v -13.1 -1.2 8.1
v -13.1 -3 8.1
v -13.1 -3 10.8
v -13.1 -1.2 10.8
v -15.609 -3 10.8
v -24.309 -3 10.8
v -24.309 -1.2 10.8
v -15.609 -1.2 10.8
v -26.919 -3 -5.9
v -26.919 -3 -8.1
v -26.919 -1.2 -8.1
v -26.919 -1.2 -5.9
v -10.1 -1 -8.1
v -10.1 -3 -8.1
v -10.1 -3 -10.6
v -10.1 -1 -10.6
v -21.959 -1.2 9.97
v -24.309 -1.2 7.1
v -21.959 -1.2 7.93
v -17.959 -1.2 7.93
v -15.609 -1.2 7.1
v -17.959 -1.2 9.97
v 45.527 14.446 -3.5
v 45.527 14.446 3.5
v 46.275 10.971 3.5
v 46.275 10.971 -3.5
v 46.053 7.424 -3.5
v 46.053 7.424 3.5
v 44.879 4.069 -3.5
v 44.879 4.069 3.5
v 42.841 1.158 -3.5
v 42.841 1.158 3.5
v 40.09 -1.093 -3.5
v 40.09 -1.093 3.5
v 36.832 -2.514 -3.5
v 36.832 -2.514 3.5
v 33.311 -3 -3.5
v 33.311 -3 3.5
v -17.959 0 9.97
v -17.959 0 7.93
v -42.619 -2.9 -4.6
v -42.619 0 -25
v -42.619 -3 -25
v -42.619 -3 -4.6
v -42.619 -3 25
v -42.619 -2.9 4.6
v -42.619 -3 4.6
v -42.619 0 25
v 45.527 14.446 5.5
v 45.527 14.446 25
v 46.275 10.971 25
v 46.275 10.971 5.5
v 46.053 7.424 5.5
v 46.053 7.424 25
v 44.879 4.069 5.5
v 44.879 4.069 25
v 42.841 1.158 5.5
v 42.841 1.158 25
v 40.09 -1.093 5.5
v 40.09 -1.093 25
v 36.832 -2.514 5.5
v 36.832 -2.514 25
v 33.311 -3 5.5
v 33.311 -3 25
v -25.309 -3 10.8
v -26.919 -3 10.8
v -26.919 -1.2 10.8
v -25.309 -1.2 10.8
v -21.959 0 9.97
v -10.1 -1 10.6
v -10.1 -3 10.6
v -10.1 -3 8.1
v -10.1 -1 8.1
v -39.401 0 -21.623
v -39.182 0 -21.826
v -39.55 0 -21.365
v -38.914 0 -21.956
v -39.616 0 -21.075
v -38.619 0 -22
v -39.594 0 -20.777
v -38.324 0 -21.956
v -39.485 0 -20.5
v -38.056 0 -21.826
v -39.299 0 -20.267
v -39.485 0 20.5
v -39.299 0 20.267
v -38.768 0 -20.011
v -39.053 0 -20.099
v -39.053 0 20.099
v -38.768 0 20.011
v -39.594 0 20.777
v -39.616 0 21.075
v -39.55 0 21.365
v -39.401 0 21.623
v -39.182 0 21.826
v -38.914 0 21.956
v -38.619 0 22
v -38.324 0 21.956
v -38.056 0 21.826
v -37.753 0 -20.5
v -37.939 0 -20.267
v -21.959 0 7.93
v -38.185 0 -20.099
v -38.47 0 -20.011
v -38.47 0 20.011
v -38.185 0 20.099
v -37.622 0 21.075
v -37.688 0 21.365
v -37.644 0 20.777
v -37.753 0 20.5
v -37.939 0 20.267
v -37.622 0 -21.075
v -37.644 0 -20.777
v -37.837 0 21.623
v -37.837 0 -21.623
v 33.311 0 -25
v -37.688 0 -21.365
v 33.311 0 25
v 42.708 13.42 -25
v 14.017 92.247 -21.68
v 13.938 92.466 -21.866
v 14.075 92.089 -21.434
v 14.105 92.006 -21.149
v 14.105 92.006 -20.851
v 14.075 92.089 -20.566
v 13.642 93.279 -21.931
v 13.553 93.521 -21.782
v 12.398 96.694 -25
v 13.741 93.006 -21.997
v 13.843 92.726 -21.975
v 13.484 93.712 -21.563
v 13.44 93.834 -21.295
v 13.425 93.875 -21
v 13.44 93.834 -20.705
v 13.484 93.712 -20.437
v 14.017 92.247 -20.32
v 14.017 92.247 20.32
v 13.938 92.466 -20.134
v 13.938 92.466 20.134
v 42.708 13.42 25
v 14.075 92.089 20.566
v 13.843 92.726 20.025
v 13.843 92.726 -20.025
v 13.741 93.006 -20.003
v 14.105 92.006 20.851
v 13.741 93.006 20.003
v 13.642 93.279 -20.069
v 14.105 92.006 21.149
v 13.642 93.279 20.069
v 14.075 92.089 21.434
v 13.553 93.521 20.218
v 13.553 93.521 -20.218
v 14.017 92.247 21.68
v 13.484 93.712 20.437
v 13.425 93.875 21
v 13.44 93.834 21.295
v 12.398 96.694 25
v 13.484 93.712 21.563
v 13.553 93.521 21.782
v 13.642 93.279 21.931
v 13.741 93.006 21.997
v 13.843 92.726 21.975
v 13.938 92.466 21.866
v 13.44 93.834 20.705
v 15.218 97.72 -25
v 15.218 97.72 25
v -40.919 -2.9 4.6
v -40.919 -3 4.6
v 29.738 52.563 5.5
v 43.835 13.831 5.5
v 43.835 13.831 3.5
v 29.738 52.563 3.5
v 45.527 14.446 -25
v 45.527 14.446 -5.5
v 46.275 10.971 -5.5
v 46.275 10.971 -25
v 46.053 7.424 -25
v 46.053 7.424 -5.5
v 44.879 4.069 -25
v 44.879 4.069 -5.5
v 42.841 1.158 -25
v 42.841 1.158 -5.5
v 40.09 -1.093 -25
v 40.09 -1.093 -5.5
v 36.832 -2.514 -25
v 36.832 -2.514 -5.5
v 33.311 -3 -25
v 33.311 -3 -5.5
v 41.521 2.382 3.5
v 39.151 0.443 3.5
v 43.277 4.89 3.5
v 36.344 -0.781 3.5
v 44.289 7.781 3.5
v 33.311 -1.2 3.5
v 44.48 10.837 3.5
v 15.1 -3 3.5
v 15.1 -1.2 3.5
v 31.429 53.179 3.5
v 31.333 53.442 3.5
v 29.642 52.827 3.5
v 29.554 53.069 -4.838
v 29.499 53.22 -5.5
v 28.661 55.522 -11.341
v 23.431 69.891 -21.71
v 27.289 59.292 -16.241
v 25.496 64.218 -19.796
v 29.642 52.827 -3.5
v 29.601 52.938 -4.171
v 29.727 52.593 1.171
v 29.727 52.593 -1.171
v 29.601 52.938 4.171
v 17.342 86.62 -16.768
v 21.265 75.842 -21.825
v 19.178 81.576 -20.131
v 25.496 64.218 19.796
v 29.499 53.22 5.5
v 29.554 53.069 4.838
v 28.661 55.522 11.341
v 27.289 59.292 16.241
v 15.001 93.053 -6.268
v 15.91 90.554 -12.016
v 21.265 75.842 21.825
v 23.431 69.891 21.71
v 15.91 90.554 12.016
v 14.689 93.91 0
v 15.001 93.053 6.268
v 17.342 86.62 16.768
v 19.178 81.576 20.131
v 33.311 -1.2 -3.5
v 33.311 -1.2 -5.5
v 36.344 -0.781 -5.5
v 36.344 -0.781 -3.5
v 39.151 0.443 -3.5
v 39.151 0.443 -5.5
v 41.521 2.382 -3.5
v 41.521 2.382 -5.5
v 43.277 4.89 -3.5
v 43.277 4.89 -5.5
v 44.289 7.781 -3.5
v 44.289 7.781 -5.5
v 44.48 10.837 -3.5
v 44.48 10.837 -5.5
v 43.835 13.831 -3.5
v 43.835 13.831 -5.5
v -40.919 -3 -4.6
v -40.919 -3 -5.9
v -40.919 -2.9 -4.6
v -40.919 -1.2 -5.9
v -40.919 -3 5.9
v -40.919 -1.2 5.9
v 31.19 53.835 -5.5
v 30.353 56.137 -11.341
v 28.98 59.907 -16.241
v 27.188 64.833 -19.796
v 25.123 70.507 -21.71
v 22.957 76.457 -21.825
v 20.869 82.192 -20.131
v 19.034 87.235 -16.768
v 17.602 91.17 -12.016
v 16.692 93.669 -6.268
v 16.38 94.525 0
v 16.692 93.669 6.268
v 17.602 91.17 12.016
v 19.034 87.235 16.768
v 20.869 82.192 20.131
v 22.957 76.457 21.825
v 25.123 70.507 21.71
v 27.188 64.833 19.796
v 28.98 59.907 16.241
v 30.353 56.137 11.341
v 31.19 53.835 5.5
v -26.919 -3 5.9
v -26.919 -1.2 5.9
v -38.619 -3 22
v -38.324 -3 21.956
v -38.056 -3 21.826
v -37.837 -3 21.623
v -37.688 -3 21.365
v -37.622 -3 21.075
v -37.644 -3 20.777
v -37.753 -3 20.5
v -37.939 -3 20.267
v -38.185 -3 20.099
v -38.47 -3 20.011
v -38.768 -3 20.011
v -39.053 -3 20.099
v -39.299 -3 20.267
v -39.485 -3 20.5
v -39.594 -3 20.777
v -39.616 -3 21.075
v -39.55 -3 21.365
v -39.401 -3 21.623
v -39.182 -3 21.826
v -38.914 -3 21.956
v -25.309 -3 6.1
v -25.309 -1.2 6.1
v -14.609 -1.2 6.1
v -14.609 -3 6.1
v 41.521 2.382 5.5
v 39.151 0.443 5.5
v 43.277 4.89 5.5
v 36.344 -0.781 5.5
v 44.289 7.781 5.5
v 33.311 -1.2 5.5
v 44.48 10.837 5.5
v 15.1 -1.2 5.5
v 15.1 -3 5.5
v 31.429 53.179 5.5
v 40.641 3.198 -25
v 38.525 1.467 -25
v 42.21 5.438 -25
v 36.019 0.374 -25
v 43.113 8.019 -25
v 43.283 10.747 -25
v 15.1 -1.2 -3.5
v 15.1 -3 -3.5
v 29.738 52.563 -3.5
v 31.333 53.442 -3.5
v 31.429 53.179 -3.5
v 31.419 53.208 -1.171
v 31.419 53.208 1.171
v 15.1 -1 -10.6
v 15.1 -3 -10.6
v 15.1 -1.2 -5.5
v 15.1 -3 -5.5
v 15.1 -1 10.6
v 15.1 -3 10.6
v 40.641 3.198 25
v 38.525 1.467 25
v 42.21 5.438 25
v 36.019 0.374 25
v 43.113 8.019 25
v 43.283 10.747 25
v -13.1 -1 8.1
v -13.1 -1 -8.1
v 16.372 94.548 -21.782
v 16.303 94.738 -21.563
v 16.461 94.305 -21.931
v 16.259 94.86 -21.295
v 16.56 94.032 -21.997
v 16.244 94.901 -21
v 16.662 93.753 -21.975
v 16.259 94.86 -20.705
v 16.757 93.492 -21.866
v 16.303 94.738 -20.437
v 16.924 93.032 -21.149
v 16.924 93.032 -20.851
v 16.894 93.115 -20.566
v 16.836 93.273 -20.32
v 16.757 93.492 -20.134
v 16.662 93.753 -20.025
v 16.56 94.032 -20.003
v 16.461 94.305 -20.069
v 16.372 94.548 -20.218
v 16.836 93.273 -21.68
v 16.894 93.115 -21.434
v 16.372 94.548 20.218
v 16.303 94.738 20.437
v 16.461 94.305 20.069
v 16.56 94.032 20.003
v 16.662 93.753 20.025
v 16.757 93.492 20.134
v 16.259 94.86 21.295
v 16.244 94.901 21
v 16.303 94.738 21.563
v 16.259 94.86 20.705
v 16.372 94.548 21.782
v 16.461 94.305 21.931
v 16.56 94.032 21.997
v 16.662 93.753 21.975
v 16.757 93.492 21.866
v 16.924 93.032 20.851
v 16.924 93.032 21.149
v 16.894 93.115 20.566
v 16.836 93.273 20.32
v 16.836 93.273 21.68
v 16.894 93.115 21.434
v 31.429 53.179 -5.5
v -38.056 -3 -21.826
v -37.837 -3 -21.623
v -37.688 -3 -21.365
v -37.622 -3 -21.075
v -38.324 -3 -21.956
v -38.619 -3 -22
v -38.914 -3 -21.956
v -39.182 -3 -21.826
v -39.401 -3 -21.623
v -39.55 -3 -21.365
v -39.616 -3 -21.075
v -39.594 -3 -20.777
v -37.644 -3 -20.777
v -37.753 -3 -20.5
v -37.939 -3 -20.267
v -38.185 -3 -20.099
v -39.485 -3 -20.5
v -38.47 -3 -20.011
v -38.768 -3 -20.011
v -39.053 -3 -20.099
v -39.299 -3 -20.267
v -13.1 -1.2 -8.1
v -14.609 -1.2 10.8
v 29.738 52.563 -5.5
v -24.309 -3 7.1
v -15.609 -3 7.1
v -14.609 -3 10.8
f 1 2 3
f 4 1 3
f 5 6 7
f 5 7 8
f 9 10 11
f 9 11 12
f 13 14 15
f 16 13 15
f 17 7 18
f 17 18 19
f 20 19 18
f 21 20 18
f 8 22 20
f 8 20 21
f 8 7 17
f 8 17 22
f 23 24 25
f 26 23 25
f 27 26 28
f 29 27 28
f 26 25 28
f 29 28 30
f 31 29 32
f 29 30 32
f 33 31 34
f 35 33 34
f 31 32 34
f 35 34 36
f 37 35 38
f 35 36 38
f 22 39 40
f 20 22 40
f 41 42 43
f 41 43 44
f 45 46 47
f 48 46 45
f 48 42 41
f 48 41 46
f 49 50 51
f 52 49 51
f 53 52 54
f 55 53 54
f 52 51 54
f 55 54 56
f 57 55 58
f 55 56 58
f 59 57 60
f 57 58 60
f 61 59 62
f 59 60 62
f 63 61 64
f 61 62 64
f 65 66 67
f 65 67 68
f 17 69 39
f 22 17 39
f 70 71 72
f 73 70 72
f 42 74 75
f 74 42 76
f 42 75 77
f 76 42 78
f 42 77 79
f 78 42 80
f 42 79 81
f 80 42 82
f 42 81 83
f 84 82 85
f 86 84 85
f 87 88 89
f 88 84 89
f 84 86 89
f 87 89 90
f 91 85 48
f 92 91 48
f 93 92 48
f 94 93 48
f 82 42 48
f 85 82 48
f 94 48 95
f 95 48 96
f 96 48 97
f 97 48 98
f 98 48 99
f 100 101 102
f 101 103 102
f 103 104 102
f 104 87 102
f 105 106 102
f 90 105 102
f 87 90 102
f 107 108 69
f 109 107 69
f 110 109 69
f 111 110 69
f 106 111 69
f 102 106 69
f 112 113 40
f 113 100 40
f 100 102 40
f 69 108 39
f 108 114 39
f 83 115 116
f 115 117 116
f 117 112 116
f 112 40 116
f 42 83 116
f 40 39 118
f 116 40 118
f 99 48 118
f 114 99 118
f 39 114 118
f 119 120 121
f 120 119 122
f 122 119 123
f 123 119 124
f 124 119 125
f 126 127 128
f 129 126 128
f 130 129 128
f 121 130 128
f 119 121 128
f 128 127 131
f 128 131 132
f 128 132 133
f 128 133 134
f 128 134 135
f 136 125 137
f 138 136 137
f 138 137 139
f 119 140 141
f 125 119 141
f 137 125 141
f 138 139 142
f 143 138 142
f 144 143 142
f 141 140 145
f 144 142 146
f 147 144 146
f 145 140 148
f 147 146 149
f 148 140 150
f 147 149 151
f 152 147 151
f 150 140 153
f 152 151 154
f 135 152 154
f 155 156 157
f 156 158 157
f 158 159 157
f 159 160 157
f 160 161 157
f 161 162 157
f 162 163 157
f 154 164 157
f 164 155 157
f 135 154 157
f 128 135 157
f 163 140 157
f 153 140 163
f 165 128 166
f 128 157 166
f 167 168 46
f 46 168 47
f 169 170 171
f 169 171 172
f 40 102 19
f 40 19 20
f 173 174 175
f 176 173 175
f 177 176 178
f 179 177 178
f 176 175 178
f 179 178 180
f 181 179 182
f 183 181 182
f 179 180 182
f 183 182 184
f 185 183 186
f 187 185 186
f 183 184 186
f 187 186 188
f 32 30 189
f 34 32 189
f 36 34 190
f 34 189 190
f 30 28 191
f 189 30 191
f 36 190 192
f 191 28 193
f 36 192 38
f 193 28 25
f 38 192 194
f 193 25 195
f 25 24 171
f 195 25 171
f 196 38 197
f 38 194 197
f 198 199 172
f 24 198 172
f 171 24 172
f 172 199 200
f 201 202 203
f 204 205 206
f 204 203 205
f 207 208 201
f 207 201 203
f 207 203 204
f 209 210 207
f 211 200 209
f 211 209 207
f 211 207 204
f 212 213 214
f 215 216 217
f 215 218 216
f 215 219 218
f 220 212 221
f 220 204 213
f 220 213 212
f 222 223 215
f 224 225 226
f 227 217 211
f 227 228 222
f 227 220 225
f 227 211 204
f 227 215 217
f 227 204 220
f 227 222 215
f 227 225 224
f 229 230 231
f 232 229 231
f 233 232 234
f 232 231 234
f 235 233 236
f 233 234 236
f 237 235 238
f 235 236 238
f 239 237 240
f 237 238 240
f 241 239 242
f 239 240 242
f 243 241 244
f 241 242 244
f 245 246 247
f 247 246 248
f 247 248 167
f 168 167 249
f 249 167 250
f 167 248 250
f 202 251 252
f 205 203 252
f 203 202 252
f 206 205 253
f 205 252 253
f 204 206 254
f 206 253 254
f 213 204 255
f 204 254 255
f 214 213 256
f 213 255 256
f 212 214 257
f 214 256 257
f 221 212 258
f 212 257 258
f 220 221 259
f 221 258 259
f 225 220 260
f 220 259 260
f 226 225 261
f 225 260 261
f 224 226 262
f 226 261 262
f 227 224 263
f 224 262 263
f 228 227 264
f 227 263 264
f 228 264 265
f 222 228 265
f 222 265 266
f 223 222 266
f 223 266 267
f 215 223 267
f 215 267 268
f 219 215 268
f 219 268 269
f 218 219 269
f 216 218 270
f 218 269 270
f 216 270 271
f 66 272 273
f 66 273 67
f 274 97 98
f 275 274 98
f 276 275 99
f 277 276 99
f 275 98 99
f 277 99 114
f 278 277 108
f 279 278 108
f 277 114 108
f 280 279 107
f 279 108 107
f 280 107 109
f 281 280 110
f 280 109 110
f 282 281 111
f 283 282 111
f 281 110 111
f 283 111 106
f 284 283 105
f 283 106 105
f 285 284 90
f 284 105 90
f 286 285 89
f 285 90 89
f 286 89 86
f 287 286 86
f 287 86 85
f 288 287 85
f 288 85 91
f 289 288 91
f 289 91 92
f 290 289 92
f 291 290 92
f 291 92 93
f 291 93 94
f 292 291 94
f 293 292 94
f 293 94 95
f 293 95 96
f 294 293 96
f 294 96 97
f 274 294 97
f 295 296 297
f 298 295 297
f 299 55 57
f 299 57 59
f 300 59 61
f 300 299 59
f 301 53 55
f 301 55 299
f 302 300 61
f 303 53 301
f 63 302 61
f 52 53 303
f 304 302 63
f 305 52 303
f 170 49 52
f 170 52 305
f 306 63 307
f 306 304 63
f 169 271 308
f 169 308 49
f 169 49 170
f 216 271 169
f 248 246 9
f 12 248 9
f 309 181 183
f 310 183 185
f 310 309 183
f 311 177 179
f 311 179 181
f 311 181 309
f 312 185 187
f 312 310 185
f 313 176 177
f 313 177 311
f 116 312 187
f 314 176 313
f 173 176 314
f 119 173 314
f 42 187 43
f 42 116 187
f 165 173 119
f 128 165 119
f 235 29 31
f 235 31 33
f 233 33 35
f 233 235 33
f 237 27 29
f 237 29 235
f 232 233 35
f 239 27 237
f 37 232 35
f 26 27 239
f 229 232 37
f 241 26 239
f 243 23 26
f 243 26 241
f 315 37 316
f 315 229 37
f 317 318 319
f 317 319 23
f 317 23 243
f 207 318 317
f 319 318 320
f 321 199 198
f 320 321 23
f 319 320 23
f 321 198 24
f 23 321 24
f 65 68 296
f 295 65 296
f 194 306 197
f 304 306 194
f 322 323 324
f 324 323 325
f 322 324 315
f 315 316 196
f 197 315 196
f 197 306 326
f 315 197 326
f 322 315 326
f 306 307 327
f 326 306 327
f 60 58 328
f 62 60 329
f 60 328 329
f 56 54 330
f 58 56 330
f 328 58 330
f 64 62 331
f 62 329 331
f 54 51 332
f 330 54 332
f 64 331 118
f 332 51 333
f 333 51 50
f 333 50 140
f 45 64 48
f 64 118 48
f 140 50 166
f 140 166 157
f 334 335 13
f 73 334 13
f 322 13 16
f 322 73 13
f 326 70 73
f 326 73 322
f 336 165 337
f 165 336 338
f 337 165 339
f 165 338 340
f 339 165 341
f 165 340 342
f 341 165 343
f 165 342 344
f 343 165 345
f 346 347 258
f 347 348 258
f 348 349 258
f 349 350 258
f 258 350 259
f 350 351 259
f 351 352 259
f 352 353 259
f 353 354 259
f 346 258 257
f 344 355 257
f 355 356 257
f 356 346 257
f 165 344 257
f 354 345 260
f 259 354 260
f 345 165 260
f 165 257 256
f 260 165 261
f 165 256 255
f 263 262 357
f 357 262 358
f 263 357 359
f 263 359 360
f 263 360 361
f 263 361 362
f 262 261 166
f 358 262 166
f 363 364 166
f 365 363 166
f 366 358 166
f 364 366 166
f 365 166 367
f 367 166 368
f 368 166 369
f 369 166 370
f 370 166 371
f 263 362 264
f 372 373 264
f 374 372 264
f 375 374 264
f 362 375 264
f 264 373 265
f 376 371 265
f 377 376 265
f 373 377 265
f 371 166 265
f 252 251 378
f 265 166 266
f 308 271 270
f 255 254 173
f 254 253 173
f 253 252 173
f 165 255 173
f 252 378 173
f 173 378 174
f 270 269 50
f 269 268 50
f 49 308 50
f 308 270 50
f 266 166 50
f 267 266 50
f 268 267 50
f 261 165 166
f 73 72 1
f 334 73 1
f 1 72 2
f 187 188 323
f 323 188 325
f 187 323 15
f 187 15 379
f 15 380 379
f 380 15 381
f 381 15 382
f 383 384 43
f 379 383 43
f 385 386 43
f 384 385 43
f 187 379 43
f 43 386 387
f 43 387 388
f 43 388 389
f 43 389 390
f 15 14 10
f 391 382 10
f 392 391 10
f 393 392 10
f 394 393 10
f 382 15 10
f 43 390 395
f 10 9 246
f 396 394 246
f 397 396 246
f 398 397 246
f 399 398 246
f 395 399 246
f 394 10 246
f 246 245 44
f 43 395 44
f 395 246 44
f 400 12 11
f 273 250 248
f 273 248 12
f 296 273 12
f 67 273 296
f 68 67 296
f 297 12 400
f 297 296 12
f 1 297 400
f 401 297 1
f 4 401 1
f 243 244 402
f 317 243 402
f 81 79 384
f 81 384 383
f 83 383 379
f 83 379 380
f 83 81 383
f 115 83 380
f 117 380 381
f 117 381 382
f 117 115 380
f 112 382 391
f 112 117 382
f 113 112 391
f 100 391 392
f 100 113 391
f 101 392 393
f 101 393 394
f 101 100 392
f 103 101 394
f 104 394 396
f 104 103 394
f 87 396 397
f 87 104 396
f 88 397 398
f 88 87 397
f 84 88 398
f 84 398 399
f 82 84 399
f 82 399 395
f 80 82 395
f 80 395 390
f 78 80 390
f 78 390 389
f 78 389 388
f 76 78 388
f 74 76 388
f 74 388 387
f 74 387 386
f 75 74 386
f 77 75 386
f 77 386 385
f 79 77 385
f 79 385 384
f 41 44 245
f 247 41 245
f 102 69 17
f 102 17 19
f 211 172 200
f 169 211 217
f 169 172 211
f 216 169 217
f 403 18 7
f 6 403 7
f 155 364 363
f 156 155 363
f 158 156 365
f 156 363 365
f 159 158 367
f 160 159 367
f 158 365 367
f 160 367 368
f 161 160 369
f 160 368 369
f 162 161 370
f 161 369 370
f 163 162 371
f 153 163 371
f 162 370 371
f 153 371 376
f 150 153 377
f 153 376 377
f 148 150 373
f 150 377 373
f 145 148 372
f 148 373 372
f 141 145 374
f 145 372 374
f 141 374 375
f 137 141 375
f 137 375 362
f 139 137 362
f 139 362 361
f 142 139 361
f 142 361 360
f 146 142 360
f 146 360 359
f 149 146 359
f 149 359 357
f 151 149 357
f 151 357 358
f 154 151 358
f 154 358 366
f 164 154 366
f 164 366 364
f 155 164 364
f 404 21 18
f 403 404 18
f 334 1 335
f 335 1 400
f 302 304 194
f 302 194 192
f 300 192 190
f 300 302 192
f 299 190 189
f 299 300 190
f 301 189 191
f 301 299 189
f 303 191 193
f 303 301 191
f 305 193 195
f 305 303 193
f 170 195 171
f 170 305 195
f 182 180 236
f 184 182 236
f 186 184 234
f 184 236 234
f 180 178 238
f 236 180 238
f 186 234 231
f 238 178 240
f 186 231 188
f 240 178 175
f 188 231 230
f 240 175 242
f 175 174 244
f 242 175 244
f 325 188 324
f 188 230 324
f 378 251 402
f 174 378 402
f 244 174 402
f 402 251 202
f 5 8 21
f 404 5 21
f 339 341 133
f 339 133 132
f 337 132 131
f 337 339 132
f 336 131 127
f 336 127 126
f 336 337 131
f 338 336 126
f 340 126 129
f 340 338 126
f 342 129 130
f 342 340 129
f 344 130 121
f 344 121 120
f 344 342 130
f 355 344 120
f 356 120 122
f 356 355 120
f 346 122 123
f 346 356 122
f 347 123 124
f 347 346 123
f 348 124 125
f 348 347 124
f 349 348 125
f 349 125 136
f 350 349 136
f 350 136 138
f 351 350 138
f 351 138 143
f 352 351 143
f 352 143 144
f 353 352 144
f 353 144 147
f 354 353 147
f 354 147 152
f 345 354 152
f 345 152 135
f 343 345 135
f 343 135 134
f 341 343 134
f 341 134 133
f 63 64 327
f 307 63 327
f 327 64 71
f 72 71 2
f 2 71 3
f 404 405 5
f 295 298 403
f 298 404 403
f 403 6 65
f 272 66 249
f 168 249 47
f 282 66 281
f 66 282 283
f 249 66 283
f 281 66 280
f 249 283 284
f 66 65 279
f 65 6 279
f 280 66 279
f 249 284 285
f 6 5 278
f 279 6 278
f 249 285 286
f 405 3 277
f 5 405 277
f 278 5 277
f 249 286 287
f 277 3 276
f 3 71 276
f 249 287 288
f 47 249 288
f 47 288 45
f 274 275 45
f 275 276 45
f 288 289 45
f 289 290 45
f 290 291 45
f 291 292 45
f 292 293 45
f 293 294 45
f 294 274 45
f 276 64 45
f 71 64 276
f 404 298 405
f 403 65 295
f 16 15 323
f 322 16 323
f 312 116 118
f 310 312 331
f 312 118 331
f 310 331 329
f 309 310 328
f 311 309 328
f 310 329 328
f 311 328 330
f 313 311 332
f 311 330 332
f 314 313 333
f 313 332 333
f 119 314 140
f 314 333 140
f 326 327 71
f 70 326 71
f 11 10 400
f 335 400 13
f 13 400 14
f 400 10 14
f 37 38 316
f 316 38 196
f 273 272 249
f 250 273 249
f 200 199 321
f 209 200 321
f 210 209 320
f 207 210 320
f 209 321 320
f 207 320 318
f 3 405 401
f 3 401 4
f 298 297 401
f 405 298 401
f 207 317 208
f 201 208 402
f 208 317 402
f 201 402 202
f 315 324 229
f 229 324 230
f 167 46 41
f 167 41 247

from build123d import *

# Parameters (mm, degrees)
EXTRUDE_1_DEPTH       = 25
SKETCH_4_R            = 22
CUT_EXTRUDE_1_DEPTH   = 1.8
CUT_EXTRUDE_START     = 5.5
CUT_EXTRUDE_1_2_DEPTH = 2
CUT_EXTRUDE_2_REACH   = 124.068
SKETCH_5_R            = 1
CUT_EXTRUDE_3_REACH   = 112.991
SKETCH_6_R            = 1
CUT_EXTRUDE_1_3_DEPTH = 1.8
SKETCH_8_W            = 1.7
SKETCH_8_H            = 9.2
EXTRUDE_1_2_DEPTH     = 1.7
CUT_EXTRUDE_2_2_DEPTH = 2
SKETCH_14_W           = 13.81884782
SKETCH_14_H           = 18.9
CUT_EXTRUDE_3_2_DEPTH = 1.8
EXTRUDE_2_DEPTH       = 1.8
SKETCH_16_W           = 4
SKETCH_16_H           = 2.04
CUT_EXTRUDE_4_DEPTH   = 1.2


with BuildPart() as part:
    # 草图2 → Extrude 1 (new, symmetric)
    with BuildSketch(Plane.XY):
        with BuildLine():
            Line((-42.61884782, 0), (33.310872136, 0))
            ThreePointArc((33.310872136, 0), (41.502392579, 4.264235636), (42.707798344, 13.420201433))
            Line((42.707798344, 13.420201433), (12.398479455, 96.694370679))
            Line((12.398479455, 96.694370679), (15.217557318, 97.720431109))
            Line((15.217557318, 97.720431109), (45.526876206, 14.446261863))
            ThreePointArc((45.526876206, 14.446261863), (43.959848712, 2.543506327), (33.310872136, -3))
            Line((33.310872136, -3), (-42.61884782, -3))
            Line((-42.61884782, -3), (-42.61884782, 0))
        make_face()
    extrude(amount=EXTRUDE_1_DEPTH, both=True)

    # 草图4 → Cut-Extrude 1 (cut)
    with BuildSketch(Plane(origin=(44.844182434, 16.321947586, 0), x_dir=(0, 0, -1), z_dir=(0.939692620785907, 0.3420201433256728, 0))):
        with Locations(Location((0, 61.222456878, 0), (0, 0, 90))):
            Circle(SKETCH_4_R)
    extrude(amount=-CUT_EXTRUDE_1_DEPTH, mode=Mode.SUBTRACT)

    # 草图3 → Cut-Extrude 1 2 (cut)
    with BuildSketch(Plane.XY.offset(CUT_EXTRUDE_START)):
        with BuildLine():
            Line((8.762964592, -1.2), (33.310872136, -1.2))
            ThreePointArc((33.310872136, -1.2), (42.485375032, 3.575943913), (43.835429489, 13.830625605))
            Line((43.835429489, 13.830625605), (29.737865394, 52.563364626))
            Line((29.737865394, 52.563364626), (28.711804964, 55.382442488))
            Line((28.711804964, 55.382442488), (30.403251681, 55.998078746))
            Line((30.403251681, 55.998078746), (31.429312111, 53.179000884))
            Line((31.429312111, 53.179000884), (45.526876206, 14.446261863))
            ThreePointArc((45.526876206, 14.446261863), (43.959848712, 2.543506327), (33.310872136, -3))
            Line((33.310872136, -3), (8.762964592, -3))
            Line((8.762964592, -3), (8.762964592, -1.2))
        make_face()
    cut_extrude_1_2 = extrude(amount=-CUT_EXTRUDE_1_2_DEPTH, mode=Mode.SUBTRACT)

    # 镜向1: Cut-Extrude 1 2 across plane
    add(cut_extrude_1_2.mirror(Plane.XY), mode=Mode.SUBTRACT)

    # 草图5 → Cut-Extrude 2 (cut, up to next)
    with BuildSketch(Plane(origin=(44.844182434, 16.321947586, 0), x_dir=(0, 0, -1), z_dir=(0.939692620785907, 0.3420201433256728, 0)), mode=Mode.PRIVATE) as cut_extrude_2_sk1:
        with Locations(Location((-21, 82.622456878, 0), (0, 0, 90))):
            Circle(SKETCH_5_R)
    cut_extrude_2_tool1 = extrude(cut_extrude_2_sk1.sketch, amount=-CUT_EXTRUDE_2_REACH, mode=Mode.PRIVATE) & part.part
    cut_extrude_2 = cut_extrude_2_tool1.solids().sort_by_distance((16.585638, 93.961661, 21))[0]
    add(cut_extrude_2, mode=Mode.SUBTRACT)

    # 镜向2: Cut-Extrude 2 across plane
    add(cut_extrude_2.mirror(Plane.XY), mode=Mode.SUBTRACT)

    # 草图6 → Cut-Extrude 3 (cut, up to next)
    with BuildSketch(Plane(origin=(0, 0, 0), x_dir=(1, 0, 0), z_dir=(0, 1, 0)), mode=Mode.PRIVATE) as cut_extrude_3_sk1:
        with Locations(Location((-38.61884782, -21, 0), (0, 0, 270))):
            Circle(SKETCH_6_R)
    cut_extrude_3_tool1 = extrude(cut_extrude_3_sk1.sketch, amount=-CUT_EXTRUDE_3_REACH, mode=Mode.PRIVATE) & part.part
    cut_extrude_3 = cut_extrude_3_tool1.solids().sort_by_distance((-38.618848, 0, 21))[0]
    add(cut_extrude_3, mode=Mode.SUBTRACT)

    # 镜向3: Cut-Extrude 3 across plane
    add(cut_extrude_3.mirror(Plane.XY), mode=Mode.SUBTRACT)

    # 草图7 → Cut-Extrude 1 3 (cut)
    with BuildSketch(Plane.XZ.offset(3)):
        Polygon((-40.91884782, -5.9), (-26.91884782, -5.9), (-26.91884782, 5.9), (-40.91884782, 5.9), (-40.91884782, 4.6), (-42.61884782, 4.6), (-42.61884782, -4.6), (-40.91884782, -4.6), align=None)
    extrude(amount=-CUT_EXTRUDE_1_3_DEPTH, mode=Mode.SUBTRACT)

    # 草图8 → Extrude 1 2 (add)
    with BuildSketch(Plane.XZ.offset(1.2)):
        with Locations((-41.76884782, 0)):
            Rectangle(SKETCH_8_W, SKETCH_8_H)
    extrude(amount=EXTRUDE_1_2_DEPTH)

    # 草图12 → Cut-Extrude 2 2 (cut)
    with BuildSketch(Plane.XZ.offset(3)):
        Polygon((-10.1, -8.1), (-10.1, -10.6), (15.1, -10.6), (15.1, 10.6), (-10.1, 10.6), (-10.1, 8.1), (-13.1, 8.1), (-13.1, -8.1), align=None)
    extrude(amount=-CUT_EXTRUDE_2_2_DEPTH, mode=Mode.SUBTRACT)

    # 草图14 → Cut-Extrude 3 2 (cut)
    with BuildSketch(Plane.XZ.offset(3)):
        with Locations((-20.00942391, 1.35)):
            Rectangle(SKETCH_14_W, SKETCH_14_H)
    extrude(amount=-CUT_EXTRUDE_3_2_DEPTH, mode=Mode.SUBTRACT)

    # 草图15 → 凸台-拉伸2 (add)
    with BuildSketch(Plane.XZ.offset(1.2)):
        Polygon((-25.30942391, 6.1), (-14.60942391, 6.1), (-14.60942391, 10.8), (-15.60942391, 10.8), (-15.60942391, 7.1), (-24.30942391, 7.1), (-24.30942391, 10.8), (-25.30942391, 10.8), align=None)
    extrude(amount=EXTRUDE_2_DEPTH)

    # 草图16 → 切除-拉伸4 (cut)
    with BuildSketch(Plane(origin=(0, 0, 0), x_dir=(1, 0, 0), z_dir=(0, 1, 0))):
        with Locations((-19.95942391, -8.95)):
            Rectangle(SKETCH_16_W, SKETCH_16_H)
    extrude(amount=-CUT_EXTRUDE_4_DEPTH, mode=Mode.SUBTRACT)


solid = part.part
